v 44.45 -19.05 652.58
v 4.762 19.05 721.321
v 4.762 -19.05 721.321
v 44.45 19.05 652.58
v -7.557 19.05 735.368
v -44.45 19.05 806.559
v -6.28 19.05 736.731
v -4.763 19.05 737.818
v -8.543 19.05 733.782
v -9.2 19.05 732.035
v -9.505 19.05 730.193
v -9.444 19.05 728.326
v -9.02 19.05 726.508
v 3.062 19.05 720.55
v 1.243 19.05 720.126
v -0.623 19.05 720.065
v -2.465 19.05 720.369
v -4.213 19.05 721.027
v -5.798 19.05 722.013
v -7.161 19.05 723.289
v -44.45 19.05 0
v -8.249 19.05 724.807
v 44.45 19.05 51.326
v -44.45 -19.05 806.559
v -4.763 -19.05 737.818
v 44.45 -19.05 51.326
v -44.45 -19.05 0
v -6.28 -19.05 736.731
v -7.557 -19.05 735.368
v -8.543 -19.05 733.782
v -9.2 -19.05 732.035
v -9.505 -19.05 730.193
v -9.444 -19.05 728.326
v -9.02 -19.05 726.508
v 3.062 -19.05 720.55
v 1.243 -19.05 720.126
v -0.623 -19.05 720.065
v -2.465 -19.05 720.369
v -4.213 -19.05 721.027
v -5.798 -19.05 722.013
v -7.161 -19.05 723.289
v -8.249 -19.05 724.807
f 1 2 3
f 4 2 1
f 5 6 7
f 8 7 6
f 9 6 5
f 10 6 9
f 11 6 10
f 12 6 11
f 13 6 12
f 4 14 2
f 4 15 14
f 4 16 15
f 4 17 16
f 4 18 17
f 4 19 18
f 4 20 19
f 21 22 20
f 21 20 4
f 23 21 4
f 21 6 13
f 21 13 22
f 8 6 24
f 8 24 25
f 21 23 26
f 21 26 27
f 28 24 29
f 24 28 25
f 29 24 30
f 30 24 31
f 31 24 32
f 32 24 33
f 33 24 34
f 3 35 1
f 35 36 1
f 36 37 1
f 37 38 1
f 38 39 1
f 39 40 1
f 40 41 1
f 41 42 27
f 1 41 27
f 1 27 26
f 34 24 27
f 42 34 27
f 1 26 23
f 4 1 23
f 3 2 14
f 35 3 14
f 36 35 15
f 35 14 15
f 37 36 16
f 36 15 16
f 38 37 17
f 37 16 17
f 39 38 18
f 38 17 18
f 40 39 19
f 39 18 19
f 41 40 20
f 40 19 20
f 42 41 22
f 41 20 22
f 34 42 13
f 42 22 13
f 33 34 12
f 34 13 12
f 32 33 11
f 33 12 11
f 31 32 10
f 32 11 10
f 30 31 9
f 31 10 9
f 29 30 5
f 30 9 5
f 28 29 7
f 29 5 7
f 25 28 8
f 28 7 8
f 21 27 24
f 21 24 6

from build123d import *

# Parameters (mm, degrees)
SKETCH1_W           = 88.9
SKETCH1_H           = 38.1
BOSS_EXTRUDE1_DEPTH = 806.55922
CUT_EXTRUDE1_DEPTH  = 39.1
SKETCH3_R           = 9.525
CUT_EXTRUDE2_DEPTH  = 39.1


with BuildPart() as part:
    # Sketch1 → Boss-Extrude1 (new body)
    with BuildSketch(Plane.XY):
        Rectangle(SKETCH1_W, SKETCH1_H)
    extrude(amount=BOSS_EXTRUDE1_DEPTH)

    # Sketch2 → Cut-Extrude1 (cut, through all)
    with BuildSketch(Plane(origin=(0, 19.05, 0), x_dir=(1, 0, 0), z_dir=(0, 1, 0))):
        Polygon((-44.45, 0), (44.45, 0), (44.45, -51.326438931), align=None)
        Polygon((-44.45, -806.55922), (44.45, -652.579903207), (44.45, -806.55922), align=None)
    extrude(amount=-CUT_EXTRUDE1_DEPTH, mode=Mode.SUBTRACT)

    # Sketch3 → Cut-Extrude2 (cut, through all)
    with BuildSketch(Plane(origin=(0, 19.05, 0), x_dir=(1, 0, 0), z_dir=(0, 1, 0))):
        with Locations((0, -729.569561604)):
            Circle(SKETCH3_R)
    extrude(amount=-CUT_EXTRUDE2_DEPTH, mode=Mode.SUBTRACT)


solid = part.part
